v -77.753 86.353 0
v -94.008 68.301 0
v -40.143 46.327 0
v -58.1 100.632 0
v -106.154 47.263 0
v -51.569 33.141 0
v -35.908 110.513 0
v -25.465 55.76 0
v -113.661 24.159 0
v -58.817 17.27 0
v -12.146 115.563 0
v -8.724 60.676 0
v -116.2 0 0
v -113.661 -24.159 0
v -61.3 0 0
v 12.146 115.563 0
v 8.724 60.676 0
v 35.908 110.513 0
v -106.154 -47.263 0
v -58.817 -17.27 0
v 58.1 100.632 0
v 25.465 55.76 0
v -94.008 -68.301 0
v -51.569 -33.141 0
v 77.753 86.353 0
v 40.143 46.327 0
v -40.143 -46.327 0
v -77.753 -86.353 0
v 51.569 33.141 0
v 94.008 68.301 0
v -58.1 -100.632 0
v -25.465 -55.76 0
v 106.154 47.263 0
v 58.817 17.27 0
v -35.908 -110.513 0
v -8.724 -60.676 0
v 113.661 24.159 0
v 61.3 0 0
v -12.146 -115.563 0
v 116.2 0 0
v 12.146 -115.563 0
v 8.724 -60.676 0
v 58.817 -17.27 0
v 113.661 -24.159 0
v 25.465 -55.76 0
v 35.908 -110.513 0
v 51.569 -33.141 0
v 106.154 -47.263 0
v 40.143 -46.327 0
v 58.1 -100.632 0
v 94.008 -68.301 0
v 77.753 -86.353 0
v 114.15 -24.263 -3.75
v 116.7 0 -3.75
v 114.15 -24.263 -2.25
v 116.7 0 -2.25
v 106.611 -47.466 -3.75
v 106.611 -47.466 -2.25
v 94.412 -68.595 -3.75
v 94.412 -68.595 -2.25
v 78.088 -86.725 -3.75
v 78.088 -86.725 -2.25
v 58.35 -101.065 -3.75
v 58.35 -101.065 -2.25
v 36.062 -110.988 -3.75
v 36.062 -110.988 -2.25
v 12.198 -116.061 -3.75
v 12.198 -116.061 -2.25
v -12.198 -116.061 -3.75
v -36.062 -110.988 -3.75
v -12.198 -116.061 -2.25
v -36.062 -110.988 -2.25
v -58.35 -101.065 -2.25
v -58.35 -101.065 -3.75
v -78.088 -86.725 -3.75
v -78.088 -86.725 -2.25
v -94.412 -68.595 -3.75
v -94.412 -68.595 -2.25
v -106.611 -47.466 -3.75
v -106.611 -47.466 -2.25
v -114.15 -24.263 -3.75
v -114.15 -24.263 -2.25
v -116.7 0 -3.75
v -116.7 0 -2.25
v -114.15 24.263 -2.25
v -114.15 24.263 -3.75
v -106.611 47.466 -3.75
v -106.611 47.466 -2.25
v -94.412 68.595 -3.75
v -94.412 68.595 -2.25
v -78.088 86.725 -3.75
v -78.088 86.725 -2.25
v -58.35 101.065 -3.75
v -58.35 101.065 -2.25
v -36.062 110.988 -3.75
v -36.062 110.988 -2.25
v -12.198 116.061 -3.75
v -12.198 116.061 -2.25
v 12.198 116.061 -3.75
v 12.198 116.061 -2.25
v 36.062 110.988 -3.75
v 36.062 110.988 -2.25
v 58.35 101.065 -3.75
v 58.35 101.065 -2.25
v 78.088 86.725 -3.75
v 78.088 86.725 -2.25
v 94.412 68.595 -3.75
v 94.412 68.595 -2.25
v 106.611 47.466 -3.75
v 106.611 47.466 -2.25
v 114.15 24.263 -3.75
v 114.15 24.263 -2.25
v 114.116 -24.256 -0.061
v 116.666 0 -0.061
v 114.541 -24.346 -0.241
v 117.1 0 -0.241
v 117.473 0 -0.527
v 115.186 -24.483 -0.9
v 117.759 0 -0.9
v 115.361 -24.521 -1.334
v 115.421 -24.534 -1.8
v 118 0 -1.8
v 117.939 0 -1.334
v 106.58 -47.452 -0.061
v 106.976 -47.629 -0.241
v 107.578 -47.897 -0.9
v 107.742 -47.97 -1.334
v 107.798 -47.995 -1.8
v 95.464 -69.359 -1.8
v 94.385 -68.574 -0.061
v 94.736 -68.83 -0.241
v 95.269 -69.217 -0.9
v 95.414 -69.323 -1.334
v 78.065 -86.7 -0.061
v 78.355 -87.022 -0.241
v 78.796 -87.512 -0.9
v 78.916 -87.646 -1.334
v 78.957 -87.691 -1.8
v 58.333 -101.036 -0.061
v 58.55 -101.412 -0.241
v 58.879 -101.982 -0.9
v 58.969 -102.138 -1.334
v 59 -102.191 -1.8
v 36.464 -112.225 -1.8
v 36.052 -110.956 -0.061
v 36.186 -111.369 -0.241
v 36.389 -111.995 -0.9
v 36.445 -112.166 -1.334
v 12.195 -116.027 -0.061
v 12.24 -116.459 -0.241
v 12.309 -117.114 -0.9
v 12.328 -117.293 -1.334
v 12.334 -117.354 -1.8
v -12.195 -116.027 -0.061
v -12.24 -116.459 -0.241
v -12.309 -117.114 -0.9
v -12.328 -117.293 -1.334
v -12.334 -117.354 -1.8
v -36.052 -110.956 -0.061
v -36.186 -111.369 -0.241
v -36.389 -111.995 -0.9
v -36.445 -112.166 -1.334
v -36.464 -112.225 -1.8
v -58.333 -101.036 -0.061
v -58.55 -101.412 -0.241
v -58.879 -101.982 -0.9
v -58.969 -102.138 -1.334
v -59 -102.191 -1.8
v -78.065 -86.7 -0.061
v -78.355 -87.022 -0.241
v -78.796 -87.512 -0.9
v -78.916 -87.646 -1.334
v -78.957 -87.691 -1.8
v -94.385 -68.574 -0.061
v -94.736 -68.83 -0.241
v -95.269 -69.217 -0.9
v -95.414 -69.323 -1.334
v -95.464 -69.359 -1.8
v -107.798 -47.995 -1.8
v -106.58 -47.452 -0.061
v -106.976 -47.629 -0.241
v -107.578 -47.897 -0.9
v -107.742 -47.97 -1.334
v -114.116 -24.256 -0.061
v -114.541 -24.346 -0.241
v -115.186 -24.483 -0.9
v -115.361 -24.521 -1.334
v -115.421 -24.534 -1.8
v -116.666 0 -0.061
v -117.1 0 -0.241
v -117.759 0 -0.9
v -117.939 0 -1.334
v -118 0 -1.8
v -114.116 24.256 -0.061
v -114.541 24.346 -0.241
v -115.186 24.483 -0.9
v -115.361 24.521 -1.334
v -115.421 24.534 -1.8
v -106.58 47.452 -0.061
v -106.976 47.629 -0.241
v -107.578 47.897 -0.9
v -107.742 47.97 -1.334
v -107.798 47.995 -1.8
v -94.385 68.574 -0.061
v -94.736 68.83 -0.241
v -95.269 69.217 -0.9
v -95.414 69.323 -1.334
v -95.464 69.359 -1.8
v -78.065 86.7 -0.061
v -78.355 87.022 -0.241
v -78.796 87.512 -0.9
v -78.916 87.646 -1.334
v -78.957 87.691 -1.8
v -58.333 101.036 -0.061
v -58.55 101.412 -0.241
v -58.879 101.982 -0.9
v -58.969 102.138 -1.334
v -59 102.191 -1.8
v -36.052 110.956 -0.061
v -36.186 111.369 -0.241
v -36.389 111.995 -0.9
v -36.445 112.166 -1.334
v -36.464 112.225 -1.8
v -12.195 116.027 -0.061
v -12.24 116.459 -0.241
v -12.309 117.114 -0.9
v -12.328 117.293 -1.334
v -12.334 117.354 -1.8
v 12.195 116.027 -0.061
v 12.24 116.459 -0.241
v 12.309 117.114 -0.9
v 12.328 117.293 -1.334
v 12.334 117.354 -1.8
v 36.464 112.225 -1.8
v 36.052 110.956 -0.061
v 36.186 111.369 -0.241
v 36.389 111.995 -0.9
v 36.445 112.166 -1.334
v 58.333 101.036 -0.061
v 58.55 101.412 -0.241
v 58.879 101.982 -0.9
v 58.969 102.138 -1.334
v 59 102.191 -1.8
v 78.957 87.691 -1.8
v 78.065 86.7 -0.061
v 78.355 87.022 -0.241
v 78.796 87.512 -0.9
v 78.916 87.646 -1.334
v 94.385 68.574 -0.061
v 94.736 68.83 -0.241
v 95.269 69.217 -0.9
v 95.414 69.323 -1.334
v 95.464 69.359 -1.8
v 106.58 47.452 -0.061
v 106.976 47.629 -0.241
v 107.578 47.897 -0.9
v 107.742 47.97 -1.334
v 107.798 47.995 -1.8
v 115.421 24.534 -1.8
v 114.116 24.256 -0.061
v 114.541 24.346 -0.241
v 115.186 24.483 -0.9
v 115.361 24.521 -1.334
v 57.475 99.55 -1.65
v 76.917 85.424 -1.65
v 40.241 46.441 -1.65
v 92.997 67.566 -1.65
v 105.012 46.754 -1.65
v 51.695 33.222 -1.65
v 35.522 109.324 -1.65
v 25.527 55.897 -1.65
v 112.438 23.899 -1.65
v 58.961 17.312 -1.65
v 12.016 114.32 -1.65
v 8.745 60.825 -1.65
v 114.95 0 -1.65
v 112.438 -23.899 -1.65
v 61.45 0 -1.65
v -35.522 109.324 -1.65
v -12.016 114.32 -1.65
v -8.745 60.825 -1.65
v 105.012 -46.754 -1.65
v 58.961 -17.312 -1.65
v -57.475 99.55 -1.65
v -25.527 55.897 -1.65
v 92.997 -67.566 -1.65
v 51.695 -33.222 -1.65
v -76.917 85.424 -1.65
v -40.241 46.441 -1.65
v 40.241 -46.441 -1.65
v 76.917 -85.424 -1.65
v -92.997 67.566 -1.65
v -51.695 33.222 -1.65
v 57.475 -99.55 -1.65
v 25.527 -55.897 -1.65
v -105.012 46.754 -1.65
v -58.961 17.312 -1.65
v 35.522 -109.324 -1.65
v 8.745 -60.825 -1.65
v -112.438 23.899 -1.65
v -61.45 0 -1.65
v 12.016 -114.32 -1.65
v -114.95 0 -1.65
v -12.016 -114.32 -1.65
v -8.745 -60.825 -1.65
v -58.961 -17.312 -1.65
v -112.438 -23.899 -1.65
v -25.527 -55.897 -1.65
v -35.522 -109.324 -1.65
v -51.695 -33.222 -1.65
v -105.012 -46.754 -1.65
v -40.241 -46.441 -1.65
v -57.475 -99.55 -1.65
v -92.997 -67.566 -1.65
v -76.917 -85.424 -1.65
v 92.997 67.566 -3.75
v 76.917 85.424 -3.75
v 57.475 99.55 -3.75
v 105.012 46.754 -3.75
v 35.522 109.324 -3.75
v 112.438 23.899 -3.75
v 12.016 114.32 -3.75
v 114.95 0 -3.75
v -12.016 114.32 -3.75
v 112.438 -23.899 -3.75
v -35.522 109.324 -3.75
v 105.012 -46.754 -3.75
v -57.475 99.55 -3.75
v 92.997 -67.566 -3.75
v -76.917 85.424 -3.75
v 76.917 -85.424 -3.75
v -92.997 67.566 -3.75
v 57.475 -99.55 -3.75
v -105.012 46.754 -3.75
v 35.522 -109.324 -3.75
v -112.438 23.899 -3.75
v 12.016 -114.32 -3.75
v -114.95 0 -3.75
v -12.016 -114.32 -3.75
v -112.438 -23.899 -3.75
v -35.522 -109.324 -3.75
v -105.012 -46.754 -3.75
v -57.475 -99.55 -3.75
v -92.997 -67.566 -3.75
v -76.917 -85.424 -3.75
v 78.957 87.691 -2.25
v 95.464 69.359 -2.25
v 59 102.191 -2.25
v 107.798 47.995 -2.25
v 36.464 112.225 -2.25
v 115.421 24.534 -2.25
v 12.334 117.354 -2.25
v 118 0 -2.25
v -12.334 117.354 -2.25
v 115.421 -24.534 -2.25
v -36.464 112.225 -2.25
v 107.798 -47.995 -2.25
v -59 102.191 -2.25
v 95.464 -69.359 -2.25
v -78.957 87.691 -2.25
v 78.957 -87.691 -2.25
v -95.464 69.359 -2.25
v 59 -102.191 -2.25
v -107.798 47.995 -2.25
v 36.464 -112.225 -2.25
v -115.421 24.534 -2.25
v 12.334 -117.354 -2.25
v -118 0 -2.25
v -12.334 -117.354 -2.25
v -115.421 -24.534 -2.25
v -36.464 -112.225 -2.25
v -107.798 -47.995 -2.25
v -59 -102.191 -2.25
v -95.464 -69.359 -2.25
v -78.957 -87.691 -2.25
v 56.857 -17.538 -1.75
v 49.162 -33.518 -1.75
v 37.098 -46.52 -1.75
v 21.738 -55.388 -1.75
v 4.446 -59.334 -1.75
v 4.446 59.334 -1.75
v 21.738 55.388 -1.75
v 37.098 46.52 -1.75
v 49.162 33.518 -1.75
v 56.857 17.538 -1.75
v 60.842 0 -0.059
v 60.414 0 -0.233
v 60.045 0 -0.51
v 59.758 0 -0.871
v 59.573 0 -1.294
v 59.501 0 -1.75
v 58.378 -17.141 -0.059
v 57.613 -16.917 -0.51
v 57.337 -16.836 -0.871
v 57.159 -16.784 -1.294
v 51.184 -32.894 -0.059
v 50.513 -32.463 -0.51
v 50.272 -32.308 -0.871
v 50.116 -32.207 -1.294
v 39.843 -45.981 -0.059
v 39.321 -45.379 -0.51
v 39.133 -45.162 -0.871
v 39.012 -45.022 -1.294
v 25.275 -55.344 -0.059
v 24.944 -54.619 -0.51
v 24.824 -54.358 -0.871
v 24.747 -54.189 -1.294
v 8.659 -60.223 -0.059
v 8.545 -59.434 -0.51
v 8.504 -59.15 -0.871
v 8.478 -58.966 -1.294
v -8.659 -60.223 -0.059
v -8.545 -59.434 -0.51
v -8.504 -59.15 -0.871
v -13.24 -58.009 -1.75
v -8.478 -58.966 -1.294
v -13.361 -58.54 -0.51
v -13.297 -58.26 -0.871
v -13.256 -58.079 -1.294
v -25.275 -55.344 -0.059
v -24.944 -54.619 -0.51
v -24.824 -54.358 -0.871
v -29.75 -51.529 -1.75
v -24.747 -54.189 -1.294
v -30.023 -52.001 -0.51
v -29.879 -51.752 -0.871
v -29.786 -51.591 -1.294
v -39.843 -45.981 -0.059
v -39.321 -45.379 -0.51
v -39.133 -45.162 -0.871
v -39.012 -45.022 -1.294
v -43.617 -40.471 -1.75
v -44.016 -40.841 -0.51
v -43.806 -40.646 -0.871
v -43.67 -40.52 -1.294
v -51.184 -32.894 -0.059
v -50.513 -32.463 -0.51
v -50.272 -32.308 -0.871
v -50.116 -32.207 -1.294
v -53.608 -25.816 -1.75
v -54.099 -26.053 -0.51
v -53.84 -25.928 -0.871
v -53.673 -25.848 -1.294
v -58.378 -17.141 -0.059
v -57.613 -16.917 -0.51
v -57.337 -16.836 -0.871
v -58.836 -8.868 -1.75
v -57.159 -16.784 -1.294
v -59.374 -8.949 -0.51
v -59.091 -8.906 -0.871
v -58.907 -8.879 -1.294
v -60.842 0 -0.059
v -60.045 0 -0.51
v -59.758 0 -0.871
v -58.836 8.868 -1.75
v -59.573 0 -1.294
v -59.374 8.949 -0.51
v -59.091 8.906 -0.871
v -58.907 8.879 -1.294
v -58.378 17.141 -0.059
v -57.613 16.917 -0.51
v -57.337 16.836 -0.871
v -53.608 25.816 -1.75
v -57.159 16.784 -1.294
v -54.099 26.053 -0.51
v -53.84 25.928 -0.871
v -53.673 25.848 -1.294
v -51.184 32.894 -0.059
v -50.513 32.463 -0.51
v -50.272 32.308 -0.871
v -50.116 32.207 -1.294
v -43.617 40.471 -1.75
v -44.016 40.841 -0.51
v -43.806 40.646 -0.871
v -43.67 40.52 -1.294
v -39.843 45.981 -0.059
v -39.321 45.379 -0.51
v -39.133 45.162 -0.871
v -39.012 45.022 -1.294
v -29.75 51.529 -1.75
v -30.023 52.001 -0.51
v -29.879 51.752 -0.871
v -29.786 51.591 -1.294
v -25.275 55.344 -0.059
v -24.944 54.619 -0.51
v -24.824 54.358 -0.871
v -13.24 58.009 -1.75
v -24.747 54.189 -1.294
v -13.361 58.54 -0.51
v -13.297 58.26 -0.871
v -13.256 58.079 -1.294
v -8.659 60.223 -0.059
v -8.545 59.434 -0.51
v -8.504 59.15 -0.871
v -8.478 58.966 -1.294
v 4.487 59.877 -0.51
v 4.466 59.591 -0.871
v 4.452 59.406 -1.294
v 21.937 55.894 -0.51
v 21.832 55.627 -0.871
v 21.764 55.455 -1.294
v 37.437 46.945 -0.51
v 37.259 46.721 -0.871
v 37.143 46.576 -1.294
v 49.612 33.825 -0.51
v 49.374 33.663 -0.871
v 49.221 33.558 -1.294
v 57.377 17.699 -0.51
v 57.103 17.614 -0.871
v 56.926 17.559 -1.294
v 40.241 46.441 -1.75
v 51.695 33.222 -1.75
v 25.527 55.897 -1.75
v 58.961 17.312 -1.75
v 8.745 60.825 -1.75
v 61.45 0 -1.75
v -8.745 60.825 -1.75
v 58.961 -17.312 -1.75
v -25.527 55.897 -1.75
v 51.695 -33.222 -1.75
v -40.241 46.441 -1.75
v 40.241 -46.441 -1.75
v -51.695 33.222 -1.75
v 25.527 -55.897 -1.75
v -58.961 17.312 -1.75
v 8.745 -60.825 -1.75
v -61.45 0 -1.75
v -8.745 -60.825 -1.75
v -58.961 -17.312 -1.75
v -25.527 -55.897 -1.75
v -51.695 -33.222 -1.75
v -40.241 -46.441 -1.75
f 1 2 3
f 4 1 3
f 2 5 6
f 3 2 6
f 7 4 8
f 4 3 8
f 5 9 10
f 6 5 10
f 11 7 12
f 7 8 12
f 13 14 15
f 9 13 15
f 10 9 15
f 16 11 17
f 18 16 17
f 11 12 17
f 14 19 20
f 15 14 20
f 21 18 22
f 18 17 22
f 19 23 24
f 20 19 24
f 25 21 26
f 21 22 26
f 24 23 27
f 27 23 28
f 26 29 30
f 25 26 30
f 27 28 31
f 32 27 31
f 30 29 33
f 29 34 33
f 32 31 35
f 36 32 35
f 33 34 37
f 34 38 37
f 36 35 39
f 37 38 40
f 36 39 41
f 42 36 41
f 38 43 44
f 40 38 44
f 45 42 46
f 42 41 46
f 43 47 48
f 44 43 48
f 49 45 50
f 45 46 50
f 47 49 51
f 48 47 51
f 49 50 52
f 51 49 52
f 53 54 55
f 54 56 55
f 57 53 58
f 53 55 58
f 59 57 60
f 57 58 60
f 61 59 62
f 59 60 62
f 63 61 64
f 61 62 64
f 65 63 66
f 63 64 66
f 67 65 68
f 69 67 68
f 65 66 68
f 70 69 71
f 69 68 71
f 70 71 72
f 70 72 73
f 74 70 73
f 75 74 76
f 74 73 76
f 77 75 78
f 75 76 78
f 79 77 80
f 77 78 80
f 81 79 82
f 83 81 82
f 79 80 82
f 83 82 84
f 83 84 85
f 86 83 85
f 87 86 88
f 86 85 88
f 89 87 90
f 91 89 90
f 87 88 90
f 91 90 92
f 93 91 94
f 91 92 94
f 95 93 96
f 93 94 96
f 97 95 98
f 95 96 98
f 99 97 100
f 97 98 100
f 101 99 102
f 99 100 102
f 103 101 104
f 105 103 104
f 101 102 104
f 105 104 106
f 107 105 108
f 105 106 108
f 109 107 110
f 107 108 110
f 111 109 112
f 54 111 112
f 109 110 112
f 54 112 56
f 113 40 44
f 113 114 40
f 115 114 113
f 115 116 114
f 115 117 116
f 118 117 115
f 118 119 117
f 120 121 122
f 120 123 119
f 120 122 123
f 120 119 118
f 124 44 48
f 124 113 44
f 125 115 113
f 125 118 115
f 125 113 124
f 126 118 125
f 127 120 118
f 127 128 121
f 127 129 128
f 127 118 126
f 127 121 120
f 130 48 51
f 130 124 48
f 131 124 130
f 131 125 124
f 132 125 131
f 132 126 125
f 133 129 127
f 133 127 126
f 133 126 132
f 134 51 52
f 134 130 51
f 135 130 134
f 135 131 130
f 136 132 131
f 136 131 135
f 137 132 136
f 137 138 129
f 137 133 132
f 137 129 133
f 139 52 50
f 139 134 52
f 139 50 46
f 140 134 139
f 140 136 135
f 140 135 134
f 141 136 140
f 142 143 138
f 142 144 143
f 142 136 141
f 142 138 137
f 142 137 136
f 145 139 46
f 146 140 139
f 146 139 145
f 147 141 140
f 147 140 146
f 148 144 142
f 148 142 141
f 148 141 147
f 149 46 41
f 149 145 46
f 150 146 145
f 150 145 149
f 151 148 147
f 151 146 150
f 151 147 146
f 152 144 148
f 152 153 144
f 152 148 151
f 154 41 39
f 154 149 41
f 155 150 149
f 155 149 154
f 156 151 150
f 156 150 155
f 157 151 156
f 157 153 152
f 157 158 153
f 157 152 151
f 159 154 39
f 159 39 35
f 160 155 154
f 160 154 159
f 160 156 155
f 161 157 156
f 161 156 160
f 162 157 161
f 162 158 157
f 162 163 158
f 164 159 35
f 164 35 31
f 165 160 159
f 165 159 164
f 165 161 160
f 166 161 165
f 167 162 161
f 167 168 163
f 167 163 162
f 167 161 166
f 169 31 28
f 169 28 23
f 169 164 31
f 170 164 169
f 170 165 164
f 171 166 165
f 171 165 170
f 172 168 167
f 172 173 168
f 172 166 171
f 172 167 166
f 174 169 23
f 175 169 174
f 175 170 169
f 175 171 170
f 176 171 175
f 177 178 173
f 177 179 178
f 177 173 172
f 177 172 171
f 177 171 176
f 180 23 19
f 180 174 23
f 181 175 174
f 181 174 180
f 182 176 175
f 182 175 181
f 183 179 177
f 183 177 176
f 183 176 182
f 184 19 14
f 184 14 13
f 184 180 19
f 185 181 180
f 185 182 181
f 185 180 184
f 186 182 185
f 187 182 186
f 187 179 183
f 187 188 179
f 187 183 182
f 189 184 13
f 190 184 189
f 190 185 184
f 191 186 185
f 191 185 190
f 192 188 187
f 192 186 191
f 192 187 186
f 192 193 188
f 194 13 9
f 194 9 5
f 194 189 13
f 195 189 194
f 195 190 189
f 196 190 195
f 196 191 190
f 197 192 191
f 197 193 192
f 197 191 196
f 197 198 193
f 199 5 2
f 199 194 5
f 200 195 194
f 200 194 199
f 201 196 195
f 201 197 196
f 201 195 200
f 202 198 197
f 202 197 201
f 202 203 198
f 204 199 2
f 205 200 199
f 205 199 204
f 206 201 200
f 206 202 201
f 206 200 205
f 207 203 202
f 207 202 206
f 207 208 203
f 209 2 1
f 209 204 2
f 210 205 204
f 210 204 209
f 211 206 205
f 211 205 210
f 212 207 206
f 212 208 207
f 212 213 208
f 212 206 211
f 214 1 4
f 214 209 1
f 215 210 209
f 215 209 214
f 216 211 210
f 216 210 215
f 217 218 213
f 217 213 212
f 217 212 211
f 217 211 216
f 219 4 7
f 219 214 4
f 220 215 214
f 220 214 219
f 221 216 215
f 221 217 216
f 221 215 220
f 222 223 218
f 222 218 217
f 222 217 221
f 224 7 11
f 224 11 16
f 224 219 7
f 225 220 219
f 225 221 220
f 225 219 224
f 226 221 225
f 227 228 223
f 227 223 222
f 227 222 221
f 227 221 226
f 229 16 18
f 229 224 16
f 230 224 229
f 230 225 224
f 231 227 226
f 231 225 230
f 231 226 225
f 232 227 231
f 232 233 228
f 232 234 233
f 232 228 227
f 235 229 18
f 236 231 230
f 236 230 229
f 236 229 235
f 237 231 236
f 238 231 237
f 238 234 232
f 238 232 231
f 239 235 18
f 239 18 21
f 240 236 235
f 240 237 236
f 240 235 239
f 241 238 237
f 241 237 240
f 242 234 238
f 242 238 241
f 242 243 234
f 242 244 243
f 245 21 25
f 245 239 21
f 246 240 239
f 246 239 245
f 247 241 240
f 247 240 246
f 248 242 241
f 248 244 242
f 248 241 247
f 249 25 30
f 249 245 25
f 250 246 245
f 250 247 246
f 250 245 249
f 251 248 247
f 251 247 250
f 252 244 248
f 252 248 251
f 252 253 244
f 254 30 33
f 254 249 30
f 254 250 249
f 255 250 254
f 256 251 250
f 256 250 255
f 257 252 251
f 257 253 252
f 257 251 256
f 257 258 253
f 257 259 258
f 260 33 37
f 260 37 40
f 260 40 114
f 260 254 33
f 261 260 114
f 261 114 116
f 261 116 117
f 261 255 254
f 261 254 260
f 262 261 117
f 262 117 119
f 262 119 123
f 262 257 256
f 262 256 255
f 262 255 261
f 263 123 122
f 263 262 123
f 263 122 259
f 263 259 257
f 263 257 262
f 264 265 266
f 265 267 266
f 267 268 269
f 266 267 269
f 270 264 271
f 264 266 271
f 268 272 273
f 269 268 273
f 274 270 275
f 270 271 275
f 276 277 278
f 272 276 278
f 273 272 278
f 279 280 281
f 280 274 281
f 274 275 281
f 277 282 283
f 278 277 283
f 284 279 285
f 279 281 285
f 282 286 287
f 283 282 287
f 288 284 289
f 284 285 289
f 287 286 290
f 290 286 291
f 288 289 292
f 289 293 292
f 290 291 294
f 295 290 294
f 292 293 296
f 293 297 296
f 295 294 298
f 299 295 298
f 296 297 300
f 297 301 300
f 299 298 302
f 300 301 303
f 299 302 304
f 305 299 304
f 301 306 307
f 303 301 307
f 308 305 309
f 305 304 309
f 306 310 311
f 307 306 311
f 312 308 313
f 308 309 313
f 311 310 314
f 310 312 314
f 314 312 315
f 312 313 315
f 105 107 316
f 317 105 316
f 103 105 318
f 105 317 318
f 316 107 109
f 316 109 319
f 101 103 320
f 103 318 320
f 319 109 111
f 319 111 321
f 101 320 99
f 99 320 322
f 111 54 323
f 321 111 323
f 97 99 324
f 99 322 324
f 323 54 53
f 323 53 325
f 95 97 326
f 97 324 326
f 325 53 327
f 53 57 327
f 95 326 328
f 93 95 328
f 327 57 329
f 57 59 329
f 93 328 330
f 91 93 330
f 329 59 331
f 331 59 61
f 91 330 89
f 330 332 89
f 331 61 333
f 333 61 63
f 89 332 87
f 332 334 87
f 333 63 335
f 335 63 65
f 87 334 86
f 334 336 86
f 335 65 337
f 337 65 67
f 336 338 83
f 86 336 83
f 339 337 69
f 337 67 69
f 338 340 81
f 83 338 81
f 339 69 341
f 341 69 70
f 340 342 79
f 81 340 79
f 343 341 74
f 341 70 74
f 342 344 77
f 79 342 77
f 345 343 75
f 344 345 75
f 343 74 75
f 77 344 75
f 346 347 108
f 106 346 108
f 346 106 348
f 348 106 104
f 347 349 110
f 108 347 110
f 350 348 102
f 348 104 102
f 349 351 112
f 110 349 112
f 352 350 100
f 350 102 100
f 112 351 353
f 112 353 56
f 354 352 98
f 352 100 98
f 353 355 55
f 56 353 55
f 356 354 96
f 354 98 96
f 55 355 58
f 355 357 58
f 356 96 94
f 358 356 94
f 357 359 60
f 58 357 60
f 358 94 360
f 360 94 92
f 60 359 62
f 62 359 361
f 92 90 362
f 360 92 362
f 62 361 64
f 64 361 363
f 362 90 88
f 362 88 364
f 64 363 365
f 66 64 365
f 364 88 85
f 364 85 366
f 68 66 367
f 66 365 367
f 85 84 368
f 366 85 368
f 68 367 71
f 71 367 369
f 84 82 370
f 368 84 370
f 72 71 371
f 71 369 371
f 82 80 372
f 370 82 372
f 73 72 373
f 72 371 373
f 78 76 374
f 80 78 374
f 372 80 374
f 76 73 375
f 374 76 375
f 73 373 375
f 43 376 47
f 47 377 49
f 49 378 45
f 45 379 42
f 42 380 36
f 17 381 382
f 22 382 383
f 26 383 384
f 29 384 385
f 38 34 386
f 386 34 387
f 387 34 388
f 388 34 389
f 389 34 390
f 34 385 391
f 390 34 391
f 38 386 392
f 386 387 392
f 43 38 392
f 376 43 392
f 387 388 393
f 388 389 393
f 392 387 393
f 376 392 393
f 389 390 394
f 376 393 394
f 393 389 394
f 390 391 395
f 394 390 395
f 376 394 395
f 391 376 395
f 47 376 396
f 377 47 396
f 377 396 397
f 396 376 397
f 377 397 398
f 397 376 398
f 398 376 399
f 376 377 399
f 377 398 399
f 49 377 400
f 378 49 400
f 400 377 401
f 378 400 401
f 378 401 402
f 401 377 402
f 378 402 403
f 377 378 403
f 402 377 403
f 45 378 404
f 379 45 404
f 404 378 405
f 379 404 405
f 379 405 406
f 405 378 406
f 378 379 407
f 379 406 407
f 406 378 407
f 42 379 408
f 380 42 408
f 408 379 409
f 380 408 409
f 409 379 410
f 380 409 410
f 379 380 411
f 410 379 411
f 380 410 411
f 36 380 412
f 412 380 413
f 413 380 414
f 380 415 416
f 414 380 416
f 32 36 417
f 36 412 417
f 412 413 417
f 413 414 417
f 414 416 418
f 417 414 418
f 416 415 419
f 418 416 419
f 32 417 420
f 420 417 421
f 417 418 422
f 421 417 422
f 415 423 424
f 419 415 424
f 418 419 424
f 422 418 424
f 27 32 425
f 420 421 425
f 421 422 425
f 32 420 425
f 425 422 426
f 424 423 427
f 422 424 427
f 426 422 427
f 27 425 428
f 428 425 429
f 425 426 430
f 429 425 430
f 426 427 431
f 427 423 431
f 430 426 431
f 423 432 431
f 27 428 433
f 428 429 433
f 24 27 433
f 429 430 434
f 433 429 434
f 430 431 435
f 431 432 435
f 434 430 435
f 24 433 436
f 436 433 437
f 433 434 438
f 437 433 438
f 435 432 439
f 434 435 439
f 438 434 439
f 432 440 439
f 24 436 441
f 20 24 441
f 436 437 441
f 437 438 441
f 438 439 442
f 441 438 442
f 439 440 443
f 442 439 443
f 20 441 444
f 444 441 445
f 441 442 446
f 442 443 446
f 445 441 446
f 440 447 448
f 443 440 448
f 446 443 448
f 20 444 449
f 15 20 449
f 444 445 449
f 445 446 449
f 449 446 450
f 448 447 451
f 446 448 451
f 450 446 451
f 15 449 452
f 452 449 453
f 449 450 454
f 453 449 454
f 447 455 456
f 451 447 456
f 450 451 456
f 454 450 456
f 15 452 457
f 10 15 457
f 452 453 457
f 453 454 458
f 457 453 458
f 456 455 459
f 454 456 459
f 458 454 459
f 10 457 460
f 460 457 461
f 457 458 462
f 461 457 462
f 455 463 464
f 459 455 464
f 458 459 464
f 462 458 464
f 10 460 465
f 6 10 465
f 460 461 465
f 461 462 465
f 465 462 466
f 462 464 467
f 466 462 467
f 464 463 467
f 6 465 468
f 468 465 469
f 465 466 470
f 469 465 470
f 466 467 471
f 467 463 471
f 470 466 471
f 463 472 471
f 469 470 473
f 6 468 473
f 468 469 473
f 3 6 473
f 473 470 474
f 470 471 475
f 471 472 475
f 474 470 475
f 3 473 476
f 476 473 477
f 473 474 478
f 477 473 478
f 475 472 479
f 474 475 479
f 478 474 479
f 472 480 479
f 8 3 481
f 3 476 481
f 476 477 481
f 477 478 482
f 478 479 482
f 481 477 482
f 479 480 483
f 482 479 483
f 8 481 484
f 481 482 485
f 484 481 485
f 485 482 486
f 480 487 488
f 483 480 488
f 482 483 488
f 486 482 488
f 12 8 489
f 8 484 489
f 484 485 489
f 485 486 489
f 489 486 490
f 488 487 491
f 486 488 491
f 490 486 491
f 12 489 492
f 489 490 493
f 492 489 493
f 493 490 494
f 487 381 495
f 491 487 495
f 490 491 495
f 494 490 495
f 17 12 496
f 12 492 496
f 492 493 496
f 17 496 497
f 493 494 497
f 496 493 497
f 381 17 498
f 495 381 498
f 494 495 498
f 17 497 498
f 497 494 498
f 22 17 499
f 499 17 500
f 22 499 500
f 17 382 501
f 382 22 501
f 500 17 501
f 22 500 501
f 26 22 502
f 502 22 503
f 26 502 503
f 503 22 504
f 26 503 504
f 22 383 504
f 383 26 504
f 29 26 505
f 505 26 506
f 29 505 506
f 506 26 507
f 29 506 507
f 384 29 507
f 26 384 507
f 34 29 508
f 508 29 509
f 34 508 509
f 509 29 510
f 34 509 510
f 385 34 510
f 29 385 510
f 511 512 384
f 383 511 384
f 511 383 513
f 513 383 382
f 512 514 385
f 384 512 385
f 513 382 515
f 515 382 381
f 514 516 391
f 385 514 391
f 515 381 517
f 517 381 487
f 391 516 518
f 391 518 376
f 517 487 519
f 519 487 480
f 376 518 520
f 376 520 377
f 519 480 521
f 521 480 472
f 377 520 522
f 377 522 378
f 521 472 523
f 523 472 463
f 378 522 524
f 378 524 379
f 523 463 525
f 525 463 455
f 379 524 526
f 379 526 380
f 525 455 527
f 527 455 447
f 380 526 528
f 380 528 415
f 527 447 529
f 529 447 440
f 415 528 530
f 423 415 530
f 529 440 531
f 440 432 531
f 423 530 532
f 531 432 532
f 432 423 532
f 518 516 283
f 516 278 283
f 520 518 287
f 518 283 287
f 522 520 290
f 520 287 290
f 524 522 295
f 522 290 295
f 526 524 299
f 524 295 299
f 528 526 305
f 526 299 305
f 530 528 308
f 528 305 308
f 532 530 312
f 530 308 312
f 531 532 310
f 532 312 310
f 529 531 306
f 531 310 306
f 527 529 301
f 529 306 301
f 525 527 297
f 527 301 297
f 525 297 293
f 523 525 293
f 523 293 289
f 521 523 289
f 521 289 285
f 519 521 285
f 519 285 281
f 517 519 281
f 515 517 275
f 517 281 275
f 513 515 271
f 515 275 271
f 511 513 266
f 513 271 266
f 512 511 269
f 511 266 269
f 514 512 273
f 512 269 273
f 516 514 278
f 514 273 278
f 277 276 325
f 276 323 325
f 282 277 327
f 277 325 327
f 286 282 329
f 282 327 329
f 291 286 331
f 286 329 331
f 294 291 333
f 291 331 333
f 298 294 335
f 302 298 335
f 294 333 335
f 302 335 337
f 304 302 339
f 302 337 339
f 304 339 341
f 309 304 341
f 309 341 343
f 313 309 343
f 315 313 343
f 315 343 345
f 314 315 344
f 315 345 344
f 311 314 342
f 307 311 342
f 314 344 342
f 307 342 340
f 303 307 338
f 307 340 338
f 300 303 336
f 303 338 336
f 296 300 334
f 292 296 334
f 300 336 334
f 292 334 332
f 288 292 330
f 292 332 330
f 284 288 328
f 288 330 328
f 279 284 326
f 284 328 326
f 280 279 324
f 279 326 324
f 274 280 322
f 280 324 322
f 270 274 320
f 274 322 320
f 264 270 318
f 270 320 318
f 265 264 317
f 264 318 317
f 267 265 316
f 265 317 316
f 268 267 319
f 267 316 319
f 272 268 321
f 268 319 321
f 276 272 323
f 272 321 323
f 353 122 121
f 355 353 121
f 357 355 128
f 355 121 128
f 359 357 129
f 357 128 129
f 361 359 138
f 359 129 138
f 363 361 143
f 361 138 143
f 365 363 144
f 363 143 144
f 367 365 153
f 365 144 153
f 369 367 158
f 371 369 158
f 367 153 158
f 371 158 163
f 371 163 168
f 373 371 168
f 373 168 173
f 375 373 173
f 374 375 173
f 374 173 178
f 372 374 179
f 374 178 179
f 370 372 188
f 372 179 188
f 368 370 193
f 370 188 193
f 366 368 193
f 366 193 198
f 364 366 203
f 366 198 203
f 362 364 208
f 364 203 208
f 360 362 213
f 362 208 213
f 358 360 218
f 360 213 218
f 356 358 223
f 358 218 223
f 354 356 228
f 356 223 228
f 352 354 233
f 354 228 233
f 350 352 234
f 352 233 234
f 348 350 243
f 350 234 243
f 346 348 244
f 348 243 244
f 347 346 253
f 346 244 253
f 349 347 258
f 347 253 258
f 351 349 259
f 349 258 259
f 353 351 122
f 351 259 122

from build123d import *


# Not quite as in the source:
# - a fillet or chamfer that OpenCascade refuses, or shapes differently, is made with other operations: its cross-section is extruded or revolved along the edge and cut away or added


with BuildPart() as f1:
    # F0 (on Front) → F1 (revolve)
    with BuildSketch(Plane.XZ):
        Polygon((118, 0), (59.5, 0), (59.5, -1.75), (61.45, -1.75), (61.45, -1.65), (114.95, -1.65), (114.95, -3.75), (116.7, -3.75), (116.7, -2.25), (118, -2.25), align=None)
    revolve(axis=Axis((0, 0, -2.4080555886), (0, 0, -1)))

    # F2: fillet of radius 1.8 on 2 edges, made by hand

    # F2_s1 → F2_t2 (revolve, cut)
    with BuildSketch(Plane.XZ):
        with BuildLine():
            ThreePointArc((61.3, 0), (60.0272077939, -0.5272077939), (59.5, -1.8))
            Line((59.5, -1.8), (59.5, 0))
            Line((59.5, 0), (61.3, 0))
        make_face()
    revolve(axis=Axis((0, 0, 0), (0, 0, -1)), mode=Mode.SUBTRACT)

    # F2_s3 → F2_t4 (revolve, cut)
    with BuildSketch(Plane.XZ):
        with BuildLine():
            ThreePointArc((116.2, 0), (117.4727922061, -0.5272077939), (118, -1.8))
            Line((118, -1.8), (118, 0))
            Line((118, 0), (116.2, 0))
        make_face()
    revolve(axis=Axis((0, 0, 0), (0, 0, -1)), mode=Mode.SUBTRACT)


solid = f1.part
